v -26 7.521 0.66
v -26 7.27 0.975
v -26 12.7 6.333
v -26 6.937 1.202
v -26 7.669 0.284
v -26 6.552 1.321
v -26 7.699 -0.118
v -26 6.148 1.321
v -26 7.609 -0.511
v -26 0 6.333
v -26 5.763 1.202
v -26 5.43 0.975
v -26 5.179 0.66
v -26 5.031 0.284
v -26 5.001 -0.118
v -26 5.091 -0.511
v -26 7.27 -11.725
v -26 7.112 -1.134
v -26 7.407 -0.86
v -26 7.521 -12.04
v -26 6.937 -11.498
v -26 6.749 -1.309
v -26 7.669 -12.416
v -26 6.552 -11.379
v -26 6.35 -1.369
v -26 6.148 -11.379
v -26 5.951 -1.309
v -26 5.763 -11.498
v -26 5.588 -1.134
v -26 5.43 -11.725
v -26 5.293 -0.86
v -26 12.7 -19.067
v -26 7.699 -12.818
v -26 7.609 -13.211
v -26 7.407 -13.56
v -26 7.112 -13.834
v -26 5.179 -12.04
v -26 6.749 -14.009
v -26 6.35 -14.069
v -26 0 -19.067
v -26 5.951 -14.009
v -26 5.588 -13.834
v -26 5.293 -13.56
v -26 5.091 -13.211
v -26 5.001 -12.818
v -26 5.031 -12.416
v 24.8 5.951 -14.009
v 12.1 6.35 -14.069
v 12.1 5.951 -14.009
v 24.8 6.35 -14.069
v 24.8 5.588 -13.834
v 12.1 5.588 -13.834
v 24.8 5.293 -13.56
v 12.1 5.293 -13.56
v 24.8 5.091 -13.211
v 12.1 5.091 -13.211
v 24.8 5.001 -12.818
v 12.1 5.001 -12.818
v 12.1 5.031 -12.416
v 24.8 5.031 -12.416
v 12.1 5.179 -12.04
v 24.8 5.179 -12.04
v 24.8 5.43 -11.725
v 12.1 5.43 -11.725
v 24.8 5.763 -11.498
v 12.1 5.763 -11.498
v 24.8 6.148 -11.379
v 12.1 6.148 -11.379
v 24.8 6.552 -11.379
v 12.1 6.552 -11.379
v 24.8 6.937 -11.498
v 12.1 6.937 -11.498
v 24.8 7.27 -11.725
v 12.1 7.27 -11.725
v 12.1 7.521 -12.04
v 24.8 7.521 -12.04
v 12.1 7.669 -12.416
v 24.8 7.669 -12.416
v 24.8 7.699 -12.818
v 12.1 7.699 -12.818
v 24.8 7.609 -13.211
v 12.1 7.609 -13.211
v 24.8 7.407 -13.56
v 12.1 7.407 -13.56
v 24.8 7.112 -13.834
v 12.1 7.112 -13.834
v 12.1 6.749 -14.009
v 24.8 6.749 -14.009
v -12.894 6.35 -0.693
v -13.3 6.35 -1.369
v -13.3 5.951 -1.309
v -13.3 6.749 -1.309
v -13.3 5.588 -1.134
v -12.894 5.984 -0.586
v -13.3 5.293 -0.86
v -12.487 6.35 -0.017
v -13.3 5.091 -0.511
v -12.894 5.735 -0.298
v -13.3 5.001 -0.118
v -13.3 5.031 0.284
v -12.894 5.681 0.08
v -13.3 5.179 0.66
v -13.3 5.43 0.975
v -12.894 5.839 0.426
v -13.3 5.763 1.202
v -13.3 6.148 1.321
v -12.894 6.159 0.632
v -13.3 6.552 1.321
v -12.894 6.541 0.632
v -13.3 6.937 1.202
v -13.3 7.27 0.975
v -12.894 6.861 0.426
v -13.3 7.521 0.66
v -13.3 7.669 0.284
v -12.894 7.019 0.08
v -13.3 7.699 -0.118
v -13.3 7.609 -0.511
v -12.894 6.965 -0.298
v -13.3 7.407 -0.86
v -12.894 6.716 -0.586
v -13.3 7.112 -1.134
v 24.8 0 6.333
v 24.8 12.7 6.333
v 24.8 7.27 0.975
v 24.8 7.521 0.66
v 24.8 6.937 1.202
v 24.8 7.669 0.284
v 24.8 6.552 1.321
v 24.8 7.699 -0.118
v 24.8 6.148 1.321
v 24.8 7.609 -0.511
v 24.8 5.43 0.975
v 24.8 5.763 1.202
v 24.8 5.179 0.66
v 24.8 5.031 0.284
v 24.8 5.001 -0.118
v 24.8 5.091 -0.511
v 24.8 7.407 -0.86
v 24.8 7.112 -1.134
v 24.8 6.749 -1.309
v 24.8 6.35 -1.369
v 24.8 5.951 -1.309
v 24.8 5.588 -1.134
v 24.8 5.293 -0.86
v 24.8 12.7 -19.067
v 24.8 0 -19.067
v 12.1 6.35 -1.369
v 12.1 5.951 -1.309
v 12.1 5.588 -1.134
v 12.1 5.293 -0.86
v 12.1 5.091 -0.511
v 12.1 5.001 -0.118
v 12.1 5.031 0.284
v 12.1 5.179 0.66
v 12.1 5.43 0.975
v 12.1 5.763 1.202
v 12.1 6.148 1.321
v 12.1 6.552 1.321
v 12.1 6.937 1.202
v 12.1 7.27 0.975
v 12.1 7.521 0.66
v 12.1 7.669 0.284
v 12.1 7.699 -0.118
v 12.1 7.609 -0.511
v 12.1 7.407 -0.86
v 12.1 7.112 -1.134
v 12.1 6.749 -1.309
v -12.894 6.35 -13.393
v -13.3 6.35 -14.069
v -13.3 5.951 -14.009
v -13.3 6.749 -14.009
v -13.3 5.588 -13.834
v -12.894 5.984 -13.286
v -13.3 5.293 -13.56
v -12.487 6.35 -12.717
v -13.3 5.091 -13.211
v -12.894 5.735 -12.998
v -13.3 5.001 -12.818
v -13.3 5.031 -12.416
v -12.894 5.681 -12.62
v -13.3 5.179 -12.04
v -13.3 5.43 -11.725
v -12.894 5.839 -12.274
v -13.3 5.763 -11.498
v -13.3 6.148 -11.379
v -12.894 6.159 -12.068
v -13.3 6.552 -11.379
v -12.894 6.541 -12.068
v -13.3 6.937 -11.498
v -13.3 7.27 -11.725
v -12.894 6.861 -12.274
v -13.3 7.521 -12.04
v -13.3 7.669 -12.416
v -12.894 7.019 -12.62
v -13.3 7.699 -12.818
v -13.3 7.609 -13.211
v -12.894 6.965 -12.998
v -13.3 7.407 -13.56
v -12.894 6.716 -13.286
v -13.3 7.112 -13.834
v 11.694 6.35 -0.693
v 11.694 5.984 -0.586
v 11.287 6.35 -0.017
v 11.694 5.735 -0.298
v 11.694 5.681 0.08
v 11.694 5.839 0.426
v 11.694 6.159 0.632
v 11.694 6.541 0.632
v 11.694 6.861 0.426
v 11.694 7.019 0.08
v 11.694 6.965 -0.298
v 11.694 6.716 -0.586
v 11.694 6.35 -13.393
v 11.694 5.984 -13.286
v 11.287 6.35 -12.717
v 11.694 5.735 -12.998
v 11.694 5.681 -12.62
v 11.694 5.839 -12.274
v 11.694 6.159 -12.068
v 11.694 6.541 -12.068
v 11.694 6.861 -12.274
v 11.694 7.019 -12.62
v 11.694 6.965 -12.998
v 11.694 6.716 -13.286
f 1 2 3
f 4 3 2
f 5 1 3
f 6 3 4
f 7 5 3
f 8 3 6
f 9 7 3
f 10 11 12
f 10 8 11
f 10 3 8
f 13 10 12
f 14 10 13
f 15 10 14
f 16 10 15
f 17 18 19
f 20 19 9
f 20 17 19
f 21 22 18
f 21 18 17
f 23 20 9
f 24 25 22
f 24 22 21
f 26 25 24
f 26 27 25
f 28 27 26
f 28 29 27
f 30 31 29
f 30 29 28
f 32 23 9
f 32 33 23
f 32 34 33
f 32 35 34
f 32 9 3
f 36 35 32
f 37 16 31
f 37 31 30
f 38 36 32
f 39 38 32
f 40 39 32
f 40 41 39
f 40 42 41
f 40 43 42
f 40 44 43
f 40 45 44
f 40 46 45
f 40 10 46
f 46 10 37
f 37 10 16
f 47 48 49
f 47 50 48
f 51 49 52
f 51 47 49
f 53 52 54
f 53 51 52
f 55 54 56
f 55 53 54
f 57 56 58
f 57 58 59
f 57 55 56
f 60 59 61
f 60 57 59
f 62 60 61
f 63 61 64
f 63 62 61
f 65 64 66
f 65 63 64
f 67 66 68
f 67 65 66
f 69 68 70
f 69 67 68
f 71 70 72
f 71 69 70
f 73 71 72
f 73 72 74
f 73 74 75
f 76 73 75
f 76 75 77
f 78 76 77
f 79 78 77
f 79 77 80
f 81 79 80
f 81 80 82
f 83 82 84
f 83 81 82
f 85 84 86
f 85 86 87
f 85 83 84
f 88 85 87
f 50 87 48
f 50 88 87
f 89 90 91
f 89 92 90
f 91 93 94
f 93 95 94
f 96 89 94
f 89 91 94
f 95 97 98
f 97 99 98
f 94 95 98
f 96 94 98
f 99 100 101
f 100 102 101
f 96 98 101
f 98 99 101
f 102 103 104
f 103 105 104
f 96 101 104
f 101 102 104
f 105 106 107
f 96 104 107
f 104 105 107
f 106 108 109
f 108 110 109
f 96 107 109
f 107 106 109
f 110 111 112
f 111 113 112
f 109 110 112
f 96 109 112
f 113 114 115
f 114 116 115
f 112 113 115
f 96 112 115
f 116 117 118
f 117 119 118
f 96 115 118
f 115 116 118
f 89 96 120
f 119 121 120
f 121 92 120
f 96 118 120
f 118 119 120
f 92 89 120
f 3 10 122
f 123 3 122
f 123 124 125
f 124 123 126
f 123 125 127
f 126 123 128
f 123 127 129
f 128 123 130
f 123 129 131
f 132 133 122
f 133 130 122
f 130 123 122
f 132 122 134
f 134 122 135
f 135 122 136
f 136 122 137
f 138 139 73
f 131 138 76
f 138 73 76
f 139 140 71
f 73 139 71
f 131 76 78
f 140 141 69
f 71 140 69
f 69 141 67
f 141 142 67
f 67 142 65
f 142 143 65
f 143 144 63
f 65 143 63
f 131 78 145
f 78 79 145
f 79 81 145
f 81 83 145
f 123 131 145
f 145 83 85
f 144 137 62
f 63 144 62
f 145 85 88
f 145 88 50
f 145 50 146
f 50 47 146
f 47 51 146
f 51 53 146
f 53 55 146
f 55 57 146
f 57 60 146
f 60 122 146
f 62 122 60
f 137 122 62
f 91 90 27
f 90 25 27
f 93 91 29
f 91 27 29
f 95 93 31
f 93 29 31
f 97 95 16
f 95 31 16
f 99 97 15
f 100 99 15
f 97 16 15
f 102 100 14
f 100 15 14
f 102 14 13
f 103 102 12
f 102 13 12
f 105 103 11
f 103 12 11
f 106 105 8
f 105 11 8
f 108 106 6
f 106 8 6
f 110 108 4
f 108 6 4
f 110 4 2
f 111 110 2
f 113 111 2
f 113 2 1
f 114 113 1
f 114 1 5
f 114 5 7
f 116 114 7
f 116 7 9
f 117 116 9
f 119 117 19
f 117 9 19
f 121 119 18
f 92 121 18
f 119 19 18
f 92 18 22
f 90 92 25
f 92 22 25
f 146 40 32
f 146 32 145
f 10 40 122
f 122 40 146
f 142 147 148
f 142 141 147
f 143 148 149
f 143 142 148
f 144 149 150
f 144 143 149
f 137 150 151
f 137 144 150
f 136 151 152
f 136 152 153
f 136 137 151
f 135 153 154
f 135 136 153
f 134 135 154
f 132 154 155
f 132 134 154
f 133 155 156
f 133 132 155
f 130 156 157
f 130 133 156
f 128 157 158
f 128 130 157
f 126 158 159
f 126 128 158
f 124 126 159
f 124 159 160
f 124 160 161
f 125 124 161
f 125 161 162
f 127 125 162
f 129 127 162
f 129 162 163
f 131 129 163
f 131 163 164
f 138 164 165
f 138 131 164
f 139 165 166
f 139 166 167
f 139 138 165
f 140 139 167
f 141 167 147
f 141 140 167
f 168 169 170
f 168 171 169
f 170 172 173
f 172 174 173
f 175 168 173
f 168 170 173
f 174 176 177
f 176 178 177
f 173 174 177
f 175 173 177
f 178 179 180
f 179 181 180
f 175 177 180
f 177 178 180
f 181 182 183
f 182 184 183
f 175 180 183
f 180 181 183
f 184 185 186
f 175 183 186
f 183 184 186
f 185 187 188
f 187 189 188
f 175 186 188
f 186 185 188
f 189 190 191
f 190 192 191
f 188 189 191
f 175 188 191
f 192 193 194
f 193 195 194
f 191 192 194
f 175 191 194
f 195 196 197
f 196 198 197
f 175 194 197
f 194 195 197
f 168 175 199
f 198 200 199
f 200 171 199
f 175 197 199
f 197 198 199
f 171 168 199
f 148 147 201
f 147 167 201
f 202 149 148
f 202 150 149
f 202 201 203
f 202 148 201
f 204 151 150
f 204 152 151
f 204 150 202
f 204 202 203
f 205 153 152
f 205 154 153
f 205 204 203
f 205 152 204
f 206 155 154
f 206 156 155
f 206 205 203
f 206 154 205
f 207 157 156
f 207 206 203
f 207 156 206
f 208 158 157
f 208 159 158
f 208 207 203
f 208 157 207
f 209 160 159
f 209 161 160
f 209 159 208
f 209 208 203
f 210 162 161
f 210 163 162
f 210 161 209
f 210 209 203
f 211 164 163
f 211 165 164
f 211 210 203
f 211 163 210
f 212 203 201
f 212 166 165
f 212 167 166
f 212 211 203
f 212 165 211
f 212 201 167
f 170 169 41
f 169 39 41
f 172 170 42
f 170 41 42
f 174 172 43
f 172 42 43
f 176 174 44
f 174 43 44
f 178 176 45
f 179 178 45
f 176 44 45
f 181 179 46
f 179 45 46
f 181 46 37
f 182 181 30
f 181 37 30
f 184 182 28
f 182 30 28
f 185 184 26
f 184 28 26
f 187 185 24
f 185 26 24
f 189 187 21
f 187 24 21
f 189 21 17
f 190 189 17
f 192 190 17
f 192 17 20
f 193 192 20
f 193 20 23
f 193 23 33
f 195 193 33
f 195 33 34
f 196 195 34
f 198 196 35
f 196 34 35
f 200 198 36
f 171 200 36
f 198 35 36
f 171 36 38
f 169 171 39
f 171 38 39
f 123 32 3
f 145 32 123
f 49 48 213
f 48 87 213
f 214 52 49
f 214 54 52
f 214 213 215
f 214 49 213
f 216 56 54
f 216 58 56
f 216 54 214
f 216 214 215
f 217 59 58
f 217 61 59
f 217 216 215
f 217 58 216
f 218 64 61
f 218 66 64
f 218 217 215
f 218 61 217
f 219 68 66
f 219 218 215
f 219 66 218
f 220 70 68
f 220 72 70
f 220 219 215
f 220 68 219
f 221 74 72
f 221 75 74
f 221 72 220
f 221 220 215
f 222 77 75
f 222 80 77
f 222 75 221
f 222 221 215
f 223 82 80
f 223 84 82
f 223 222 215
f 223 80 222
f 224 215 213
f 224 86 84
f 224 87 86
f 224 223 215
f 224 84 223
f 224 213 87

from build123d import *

# Parameters (mm, degrees)
SKETCH1_W                      = 50.8
SKETCH1_H                      = 25.4
BOSS_EXTRUDE1_DEPTH            = 12.7
F_6_32_TAPPED_HOLE1_AT_2_COUNT = 2
F_6_32_TAPPED_HOLE1_AT_2_PITCH = 12.7


with BuildPart() as part:
    # Sketch1 → Boss-Extrude1 (new body)
    with BuildSketch(Plane(origin=(0, 0, 0), x_dir=(1, 0, 0), z_dir=(0, 1, 0))):
        with Locations((-0.6, 6.366666667)):
            Rectangle(SKETCH1_W, SKETCH1_H)
    extrude(amount=BOSS_EXTRUDE1_DEPTH)

    # Sketch3 → #6-32 Tapped Hole1 (revolve, cut)
    with BuildSketch(Plane(origin=(24.8, 6.35, -0.016666667), x_dir=(0, 0, -1), z_dir=(0, 1, 0))):
        Polygon((0, 0), (0, 13.51269403), (1.35255, 12.7), (1.35255, 0), align=None)
    f_6_32_tapped_hole1 = revolve(axis=Axis((31.15, 6.35, -0.016666667), (-1, 0, 0)), mode=Mode.SUBTRACT)

    # #6-32 Tapped Hole1 at 2: #6-32 Tapped Hole1 ×2
    with Locations(*[(0, 0, -i * F_6_32_TAPPED_HOLE1_AT_2_PITCH) for i in range(1, F_6_32_TAPPED_HOLE1_AT_2_COUNT)]):
        add(f_6_32_tapped_hole1, mode=Mode.SUBTRACT)

    # Mirror1: #6-32 Tapped Hole1 across plane
    add(f_6_32_tapped_hole1.mirror(Plane(origin=(-0.6, 0, 0), x_dir=(0, 0, 1), z_dir=(1, 0, 0))), mode=Mode.SUBTRACT)

    # Mirror1 copy 1 sketch → Mirror1 copy 1 (revolve, cut)
    with BuildSketch(Plane(origin=(-26, 6.35, -12.716666667), x_dir=(0, 0, -1), z_dir=(0, 1, 0))):
        Polygon((0, 0), (0, -13.51269403), (1.35255, -12.7), (1.35255, 0), align=None)
    revolve(axis=Axis((-32.35, 6.35, -12.716666667), (-1, 0, 0)), mode=Mode.SUBTRACT)


solid = part.part
